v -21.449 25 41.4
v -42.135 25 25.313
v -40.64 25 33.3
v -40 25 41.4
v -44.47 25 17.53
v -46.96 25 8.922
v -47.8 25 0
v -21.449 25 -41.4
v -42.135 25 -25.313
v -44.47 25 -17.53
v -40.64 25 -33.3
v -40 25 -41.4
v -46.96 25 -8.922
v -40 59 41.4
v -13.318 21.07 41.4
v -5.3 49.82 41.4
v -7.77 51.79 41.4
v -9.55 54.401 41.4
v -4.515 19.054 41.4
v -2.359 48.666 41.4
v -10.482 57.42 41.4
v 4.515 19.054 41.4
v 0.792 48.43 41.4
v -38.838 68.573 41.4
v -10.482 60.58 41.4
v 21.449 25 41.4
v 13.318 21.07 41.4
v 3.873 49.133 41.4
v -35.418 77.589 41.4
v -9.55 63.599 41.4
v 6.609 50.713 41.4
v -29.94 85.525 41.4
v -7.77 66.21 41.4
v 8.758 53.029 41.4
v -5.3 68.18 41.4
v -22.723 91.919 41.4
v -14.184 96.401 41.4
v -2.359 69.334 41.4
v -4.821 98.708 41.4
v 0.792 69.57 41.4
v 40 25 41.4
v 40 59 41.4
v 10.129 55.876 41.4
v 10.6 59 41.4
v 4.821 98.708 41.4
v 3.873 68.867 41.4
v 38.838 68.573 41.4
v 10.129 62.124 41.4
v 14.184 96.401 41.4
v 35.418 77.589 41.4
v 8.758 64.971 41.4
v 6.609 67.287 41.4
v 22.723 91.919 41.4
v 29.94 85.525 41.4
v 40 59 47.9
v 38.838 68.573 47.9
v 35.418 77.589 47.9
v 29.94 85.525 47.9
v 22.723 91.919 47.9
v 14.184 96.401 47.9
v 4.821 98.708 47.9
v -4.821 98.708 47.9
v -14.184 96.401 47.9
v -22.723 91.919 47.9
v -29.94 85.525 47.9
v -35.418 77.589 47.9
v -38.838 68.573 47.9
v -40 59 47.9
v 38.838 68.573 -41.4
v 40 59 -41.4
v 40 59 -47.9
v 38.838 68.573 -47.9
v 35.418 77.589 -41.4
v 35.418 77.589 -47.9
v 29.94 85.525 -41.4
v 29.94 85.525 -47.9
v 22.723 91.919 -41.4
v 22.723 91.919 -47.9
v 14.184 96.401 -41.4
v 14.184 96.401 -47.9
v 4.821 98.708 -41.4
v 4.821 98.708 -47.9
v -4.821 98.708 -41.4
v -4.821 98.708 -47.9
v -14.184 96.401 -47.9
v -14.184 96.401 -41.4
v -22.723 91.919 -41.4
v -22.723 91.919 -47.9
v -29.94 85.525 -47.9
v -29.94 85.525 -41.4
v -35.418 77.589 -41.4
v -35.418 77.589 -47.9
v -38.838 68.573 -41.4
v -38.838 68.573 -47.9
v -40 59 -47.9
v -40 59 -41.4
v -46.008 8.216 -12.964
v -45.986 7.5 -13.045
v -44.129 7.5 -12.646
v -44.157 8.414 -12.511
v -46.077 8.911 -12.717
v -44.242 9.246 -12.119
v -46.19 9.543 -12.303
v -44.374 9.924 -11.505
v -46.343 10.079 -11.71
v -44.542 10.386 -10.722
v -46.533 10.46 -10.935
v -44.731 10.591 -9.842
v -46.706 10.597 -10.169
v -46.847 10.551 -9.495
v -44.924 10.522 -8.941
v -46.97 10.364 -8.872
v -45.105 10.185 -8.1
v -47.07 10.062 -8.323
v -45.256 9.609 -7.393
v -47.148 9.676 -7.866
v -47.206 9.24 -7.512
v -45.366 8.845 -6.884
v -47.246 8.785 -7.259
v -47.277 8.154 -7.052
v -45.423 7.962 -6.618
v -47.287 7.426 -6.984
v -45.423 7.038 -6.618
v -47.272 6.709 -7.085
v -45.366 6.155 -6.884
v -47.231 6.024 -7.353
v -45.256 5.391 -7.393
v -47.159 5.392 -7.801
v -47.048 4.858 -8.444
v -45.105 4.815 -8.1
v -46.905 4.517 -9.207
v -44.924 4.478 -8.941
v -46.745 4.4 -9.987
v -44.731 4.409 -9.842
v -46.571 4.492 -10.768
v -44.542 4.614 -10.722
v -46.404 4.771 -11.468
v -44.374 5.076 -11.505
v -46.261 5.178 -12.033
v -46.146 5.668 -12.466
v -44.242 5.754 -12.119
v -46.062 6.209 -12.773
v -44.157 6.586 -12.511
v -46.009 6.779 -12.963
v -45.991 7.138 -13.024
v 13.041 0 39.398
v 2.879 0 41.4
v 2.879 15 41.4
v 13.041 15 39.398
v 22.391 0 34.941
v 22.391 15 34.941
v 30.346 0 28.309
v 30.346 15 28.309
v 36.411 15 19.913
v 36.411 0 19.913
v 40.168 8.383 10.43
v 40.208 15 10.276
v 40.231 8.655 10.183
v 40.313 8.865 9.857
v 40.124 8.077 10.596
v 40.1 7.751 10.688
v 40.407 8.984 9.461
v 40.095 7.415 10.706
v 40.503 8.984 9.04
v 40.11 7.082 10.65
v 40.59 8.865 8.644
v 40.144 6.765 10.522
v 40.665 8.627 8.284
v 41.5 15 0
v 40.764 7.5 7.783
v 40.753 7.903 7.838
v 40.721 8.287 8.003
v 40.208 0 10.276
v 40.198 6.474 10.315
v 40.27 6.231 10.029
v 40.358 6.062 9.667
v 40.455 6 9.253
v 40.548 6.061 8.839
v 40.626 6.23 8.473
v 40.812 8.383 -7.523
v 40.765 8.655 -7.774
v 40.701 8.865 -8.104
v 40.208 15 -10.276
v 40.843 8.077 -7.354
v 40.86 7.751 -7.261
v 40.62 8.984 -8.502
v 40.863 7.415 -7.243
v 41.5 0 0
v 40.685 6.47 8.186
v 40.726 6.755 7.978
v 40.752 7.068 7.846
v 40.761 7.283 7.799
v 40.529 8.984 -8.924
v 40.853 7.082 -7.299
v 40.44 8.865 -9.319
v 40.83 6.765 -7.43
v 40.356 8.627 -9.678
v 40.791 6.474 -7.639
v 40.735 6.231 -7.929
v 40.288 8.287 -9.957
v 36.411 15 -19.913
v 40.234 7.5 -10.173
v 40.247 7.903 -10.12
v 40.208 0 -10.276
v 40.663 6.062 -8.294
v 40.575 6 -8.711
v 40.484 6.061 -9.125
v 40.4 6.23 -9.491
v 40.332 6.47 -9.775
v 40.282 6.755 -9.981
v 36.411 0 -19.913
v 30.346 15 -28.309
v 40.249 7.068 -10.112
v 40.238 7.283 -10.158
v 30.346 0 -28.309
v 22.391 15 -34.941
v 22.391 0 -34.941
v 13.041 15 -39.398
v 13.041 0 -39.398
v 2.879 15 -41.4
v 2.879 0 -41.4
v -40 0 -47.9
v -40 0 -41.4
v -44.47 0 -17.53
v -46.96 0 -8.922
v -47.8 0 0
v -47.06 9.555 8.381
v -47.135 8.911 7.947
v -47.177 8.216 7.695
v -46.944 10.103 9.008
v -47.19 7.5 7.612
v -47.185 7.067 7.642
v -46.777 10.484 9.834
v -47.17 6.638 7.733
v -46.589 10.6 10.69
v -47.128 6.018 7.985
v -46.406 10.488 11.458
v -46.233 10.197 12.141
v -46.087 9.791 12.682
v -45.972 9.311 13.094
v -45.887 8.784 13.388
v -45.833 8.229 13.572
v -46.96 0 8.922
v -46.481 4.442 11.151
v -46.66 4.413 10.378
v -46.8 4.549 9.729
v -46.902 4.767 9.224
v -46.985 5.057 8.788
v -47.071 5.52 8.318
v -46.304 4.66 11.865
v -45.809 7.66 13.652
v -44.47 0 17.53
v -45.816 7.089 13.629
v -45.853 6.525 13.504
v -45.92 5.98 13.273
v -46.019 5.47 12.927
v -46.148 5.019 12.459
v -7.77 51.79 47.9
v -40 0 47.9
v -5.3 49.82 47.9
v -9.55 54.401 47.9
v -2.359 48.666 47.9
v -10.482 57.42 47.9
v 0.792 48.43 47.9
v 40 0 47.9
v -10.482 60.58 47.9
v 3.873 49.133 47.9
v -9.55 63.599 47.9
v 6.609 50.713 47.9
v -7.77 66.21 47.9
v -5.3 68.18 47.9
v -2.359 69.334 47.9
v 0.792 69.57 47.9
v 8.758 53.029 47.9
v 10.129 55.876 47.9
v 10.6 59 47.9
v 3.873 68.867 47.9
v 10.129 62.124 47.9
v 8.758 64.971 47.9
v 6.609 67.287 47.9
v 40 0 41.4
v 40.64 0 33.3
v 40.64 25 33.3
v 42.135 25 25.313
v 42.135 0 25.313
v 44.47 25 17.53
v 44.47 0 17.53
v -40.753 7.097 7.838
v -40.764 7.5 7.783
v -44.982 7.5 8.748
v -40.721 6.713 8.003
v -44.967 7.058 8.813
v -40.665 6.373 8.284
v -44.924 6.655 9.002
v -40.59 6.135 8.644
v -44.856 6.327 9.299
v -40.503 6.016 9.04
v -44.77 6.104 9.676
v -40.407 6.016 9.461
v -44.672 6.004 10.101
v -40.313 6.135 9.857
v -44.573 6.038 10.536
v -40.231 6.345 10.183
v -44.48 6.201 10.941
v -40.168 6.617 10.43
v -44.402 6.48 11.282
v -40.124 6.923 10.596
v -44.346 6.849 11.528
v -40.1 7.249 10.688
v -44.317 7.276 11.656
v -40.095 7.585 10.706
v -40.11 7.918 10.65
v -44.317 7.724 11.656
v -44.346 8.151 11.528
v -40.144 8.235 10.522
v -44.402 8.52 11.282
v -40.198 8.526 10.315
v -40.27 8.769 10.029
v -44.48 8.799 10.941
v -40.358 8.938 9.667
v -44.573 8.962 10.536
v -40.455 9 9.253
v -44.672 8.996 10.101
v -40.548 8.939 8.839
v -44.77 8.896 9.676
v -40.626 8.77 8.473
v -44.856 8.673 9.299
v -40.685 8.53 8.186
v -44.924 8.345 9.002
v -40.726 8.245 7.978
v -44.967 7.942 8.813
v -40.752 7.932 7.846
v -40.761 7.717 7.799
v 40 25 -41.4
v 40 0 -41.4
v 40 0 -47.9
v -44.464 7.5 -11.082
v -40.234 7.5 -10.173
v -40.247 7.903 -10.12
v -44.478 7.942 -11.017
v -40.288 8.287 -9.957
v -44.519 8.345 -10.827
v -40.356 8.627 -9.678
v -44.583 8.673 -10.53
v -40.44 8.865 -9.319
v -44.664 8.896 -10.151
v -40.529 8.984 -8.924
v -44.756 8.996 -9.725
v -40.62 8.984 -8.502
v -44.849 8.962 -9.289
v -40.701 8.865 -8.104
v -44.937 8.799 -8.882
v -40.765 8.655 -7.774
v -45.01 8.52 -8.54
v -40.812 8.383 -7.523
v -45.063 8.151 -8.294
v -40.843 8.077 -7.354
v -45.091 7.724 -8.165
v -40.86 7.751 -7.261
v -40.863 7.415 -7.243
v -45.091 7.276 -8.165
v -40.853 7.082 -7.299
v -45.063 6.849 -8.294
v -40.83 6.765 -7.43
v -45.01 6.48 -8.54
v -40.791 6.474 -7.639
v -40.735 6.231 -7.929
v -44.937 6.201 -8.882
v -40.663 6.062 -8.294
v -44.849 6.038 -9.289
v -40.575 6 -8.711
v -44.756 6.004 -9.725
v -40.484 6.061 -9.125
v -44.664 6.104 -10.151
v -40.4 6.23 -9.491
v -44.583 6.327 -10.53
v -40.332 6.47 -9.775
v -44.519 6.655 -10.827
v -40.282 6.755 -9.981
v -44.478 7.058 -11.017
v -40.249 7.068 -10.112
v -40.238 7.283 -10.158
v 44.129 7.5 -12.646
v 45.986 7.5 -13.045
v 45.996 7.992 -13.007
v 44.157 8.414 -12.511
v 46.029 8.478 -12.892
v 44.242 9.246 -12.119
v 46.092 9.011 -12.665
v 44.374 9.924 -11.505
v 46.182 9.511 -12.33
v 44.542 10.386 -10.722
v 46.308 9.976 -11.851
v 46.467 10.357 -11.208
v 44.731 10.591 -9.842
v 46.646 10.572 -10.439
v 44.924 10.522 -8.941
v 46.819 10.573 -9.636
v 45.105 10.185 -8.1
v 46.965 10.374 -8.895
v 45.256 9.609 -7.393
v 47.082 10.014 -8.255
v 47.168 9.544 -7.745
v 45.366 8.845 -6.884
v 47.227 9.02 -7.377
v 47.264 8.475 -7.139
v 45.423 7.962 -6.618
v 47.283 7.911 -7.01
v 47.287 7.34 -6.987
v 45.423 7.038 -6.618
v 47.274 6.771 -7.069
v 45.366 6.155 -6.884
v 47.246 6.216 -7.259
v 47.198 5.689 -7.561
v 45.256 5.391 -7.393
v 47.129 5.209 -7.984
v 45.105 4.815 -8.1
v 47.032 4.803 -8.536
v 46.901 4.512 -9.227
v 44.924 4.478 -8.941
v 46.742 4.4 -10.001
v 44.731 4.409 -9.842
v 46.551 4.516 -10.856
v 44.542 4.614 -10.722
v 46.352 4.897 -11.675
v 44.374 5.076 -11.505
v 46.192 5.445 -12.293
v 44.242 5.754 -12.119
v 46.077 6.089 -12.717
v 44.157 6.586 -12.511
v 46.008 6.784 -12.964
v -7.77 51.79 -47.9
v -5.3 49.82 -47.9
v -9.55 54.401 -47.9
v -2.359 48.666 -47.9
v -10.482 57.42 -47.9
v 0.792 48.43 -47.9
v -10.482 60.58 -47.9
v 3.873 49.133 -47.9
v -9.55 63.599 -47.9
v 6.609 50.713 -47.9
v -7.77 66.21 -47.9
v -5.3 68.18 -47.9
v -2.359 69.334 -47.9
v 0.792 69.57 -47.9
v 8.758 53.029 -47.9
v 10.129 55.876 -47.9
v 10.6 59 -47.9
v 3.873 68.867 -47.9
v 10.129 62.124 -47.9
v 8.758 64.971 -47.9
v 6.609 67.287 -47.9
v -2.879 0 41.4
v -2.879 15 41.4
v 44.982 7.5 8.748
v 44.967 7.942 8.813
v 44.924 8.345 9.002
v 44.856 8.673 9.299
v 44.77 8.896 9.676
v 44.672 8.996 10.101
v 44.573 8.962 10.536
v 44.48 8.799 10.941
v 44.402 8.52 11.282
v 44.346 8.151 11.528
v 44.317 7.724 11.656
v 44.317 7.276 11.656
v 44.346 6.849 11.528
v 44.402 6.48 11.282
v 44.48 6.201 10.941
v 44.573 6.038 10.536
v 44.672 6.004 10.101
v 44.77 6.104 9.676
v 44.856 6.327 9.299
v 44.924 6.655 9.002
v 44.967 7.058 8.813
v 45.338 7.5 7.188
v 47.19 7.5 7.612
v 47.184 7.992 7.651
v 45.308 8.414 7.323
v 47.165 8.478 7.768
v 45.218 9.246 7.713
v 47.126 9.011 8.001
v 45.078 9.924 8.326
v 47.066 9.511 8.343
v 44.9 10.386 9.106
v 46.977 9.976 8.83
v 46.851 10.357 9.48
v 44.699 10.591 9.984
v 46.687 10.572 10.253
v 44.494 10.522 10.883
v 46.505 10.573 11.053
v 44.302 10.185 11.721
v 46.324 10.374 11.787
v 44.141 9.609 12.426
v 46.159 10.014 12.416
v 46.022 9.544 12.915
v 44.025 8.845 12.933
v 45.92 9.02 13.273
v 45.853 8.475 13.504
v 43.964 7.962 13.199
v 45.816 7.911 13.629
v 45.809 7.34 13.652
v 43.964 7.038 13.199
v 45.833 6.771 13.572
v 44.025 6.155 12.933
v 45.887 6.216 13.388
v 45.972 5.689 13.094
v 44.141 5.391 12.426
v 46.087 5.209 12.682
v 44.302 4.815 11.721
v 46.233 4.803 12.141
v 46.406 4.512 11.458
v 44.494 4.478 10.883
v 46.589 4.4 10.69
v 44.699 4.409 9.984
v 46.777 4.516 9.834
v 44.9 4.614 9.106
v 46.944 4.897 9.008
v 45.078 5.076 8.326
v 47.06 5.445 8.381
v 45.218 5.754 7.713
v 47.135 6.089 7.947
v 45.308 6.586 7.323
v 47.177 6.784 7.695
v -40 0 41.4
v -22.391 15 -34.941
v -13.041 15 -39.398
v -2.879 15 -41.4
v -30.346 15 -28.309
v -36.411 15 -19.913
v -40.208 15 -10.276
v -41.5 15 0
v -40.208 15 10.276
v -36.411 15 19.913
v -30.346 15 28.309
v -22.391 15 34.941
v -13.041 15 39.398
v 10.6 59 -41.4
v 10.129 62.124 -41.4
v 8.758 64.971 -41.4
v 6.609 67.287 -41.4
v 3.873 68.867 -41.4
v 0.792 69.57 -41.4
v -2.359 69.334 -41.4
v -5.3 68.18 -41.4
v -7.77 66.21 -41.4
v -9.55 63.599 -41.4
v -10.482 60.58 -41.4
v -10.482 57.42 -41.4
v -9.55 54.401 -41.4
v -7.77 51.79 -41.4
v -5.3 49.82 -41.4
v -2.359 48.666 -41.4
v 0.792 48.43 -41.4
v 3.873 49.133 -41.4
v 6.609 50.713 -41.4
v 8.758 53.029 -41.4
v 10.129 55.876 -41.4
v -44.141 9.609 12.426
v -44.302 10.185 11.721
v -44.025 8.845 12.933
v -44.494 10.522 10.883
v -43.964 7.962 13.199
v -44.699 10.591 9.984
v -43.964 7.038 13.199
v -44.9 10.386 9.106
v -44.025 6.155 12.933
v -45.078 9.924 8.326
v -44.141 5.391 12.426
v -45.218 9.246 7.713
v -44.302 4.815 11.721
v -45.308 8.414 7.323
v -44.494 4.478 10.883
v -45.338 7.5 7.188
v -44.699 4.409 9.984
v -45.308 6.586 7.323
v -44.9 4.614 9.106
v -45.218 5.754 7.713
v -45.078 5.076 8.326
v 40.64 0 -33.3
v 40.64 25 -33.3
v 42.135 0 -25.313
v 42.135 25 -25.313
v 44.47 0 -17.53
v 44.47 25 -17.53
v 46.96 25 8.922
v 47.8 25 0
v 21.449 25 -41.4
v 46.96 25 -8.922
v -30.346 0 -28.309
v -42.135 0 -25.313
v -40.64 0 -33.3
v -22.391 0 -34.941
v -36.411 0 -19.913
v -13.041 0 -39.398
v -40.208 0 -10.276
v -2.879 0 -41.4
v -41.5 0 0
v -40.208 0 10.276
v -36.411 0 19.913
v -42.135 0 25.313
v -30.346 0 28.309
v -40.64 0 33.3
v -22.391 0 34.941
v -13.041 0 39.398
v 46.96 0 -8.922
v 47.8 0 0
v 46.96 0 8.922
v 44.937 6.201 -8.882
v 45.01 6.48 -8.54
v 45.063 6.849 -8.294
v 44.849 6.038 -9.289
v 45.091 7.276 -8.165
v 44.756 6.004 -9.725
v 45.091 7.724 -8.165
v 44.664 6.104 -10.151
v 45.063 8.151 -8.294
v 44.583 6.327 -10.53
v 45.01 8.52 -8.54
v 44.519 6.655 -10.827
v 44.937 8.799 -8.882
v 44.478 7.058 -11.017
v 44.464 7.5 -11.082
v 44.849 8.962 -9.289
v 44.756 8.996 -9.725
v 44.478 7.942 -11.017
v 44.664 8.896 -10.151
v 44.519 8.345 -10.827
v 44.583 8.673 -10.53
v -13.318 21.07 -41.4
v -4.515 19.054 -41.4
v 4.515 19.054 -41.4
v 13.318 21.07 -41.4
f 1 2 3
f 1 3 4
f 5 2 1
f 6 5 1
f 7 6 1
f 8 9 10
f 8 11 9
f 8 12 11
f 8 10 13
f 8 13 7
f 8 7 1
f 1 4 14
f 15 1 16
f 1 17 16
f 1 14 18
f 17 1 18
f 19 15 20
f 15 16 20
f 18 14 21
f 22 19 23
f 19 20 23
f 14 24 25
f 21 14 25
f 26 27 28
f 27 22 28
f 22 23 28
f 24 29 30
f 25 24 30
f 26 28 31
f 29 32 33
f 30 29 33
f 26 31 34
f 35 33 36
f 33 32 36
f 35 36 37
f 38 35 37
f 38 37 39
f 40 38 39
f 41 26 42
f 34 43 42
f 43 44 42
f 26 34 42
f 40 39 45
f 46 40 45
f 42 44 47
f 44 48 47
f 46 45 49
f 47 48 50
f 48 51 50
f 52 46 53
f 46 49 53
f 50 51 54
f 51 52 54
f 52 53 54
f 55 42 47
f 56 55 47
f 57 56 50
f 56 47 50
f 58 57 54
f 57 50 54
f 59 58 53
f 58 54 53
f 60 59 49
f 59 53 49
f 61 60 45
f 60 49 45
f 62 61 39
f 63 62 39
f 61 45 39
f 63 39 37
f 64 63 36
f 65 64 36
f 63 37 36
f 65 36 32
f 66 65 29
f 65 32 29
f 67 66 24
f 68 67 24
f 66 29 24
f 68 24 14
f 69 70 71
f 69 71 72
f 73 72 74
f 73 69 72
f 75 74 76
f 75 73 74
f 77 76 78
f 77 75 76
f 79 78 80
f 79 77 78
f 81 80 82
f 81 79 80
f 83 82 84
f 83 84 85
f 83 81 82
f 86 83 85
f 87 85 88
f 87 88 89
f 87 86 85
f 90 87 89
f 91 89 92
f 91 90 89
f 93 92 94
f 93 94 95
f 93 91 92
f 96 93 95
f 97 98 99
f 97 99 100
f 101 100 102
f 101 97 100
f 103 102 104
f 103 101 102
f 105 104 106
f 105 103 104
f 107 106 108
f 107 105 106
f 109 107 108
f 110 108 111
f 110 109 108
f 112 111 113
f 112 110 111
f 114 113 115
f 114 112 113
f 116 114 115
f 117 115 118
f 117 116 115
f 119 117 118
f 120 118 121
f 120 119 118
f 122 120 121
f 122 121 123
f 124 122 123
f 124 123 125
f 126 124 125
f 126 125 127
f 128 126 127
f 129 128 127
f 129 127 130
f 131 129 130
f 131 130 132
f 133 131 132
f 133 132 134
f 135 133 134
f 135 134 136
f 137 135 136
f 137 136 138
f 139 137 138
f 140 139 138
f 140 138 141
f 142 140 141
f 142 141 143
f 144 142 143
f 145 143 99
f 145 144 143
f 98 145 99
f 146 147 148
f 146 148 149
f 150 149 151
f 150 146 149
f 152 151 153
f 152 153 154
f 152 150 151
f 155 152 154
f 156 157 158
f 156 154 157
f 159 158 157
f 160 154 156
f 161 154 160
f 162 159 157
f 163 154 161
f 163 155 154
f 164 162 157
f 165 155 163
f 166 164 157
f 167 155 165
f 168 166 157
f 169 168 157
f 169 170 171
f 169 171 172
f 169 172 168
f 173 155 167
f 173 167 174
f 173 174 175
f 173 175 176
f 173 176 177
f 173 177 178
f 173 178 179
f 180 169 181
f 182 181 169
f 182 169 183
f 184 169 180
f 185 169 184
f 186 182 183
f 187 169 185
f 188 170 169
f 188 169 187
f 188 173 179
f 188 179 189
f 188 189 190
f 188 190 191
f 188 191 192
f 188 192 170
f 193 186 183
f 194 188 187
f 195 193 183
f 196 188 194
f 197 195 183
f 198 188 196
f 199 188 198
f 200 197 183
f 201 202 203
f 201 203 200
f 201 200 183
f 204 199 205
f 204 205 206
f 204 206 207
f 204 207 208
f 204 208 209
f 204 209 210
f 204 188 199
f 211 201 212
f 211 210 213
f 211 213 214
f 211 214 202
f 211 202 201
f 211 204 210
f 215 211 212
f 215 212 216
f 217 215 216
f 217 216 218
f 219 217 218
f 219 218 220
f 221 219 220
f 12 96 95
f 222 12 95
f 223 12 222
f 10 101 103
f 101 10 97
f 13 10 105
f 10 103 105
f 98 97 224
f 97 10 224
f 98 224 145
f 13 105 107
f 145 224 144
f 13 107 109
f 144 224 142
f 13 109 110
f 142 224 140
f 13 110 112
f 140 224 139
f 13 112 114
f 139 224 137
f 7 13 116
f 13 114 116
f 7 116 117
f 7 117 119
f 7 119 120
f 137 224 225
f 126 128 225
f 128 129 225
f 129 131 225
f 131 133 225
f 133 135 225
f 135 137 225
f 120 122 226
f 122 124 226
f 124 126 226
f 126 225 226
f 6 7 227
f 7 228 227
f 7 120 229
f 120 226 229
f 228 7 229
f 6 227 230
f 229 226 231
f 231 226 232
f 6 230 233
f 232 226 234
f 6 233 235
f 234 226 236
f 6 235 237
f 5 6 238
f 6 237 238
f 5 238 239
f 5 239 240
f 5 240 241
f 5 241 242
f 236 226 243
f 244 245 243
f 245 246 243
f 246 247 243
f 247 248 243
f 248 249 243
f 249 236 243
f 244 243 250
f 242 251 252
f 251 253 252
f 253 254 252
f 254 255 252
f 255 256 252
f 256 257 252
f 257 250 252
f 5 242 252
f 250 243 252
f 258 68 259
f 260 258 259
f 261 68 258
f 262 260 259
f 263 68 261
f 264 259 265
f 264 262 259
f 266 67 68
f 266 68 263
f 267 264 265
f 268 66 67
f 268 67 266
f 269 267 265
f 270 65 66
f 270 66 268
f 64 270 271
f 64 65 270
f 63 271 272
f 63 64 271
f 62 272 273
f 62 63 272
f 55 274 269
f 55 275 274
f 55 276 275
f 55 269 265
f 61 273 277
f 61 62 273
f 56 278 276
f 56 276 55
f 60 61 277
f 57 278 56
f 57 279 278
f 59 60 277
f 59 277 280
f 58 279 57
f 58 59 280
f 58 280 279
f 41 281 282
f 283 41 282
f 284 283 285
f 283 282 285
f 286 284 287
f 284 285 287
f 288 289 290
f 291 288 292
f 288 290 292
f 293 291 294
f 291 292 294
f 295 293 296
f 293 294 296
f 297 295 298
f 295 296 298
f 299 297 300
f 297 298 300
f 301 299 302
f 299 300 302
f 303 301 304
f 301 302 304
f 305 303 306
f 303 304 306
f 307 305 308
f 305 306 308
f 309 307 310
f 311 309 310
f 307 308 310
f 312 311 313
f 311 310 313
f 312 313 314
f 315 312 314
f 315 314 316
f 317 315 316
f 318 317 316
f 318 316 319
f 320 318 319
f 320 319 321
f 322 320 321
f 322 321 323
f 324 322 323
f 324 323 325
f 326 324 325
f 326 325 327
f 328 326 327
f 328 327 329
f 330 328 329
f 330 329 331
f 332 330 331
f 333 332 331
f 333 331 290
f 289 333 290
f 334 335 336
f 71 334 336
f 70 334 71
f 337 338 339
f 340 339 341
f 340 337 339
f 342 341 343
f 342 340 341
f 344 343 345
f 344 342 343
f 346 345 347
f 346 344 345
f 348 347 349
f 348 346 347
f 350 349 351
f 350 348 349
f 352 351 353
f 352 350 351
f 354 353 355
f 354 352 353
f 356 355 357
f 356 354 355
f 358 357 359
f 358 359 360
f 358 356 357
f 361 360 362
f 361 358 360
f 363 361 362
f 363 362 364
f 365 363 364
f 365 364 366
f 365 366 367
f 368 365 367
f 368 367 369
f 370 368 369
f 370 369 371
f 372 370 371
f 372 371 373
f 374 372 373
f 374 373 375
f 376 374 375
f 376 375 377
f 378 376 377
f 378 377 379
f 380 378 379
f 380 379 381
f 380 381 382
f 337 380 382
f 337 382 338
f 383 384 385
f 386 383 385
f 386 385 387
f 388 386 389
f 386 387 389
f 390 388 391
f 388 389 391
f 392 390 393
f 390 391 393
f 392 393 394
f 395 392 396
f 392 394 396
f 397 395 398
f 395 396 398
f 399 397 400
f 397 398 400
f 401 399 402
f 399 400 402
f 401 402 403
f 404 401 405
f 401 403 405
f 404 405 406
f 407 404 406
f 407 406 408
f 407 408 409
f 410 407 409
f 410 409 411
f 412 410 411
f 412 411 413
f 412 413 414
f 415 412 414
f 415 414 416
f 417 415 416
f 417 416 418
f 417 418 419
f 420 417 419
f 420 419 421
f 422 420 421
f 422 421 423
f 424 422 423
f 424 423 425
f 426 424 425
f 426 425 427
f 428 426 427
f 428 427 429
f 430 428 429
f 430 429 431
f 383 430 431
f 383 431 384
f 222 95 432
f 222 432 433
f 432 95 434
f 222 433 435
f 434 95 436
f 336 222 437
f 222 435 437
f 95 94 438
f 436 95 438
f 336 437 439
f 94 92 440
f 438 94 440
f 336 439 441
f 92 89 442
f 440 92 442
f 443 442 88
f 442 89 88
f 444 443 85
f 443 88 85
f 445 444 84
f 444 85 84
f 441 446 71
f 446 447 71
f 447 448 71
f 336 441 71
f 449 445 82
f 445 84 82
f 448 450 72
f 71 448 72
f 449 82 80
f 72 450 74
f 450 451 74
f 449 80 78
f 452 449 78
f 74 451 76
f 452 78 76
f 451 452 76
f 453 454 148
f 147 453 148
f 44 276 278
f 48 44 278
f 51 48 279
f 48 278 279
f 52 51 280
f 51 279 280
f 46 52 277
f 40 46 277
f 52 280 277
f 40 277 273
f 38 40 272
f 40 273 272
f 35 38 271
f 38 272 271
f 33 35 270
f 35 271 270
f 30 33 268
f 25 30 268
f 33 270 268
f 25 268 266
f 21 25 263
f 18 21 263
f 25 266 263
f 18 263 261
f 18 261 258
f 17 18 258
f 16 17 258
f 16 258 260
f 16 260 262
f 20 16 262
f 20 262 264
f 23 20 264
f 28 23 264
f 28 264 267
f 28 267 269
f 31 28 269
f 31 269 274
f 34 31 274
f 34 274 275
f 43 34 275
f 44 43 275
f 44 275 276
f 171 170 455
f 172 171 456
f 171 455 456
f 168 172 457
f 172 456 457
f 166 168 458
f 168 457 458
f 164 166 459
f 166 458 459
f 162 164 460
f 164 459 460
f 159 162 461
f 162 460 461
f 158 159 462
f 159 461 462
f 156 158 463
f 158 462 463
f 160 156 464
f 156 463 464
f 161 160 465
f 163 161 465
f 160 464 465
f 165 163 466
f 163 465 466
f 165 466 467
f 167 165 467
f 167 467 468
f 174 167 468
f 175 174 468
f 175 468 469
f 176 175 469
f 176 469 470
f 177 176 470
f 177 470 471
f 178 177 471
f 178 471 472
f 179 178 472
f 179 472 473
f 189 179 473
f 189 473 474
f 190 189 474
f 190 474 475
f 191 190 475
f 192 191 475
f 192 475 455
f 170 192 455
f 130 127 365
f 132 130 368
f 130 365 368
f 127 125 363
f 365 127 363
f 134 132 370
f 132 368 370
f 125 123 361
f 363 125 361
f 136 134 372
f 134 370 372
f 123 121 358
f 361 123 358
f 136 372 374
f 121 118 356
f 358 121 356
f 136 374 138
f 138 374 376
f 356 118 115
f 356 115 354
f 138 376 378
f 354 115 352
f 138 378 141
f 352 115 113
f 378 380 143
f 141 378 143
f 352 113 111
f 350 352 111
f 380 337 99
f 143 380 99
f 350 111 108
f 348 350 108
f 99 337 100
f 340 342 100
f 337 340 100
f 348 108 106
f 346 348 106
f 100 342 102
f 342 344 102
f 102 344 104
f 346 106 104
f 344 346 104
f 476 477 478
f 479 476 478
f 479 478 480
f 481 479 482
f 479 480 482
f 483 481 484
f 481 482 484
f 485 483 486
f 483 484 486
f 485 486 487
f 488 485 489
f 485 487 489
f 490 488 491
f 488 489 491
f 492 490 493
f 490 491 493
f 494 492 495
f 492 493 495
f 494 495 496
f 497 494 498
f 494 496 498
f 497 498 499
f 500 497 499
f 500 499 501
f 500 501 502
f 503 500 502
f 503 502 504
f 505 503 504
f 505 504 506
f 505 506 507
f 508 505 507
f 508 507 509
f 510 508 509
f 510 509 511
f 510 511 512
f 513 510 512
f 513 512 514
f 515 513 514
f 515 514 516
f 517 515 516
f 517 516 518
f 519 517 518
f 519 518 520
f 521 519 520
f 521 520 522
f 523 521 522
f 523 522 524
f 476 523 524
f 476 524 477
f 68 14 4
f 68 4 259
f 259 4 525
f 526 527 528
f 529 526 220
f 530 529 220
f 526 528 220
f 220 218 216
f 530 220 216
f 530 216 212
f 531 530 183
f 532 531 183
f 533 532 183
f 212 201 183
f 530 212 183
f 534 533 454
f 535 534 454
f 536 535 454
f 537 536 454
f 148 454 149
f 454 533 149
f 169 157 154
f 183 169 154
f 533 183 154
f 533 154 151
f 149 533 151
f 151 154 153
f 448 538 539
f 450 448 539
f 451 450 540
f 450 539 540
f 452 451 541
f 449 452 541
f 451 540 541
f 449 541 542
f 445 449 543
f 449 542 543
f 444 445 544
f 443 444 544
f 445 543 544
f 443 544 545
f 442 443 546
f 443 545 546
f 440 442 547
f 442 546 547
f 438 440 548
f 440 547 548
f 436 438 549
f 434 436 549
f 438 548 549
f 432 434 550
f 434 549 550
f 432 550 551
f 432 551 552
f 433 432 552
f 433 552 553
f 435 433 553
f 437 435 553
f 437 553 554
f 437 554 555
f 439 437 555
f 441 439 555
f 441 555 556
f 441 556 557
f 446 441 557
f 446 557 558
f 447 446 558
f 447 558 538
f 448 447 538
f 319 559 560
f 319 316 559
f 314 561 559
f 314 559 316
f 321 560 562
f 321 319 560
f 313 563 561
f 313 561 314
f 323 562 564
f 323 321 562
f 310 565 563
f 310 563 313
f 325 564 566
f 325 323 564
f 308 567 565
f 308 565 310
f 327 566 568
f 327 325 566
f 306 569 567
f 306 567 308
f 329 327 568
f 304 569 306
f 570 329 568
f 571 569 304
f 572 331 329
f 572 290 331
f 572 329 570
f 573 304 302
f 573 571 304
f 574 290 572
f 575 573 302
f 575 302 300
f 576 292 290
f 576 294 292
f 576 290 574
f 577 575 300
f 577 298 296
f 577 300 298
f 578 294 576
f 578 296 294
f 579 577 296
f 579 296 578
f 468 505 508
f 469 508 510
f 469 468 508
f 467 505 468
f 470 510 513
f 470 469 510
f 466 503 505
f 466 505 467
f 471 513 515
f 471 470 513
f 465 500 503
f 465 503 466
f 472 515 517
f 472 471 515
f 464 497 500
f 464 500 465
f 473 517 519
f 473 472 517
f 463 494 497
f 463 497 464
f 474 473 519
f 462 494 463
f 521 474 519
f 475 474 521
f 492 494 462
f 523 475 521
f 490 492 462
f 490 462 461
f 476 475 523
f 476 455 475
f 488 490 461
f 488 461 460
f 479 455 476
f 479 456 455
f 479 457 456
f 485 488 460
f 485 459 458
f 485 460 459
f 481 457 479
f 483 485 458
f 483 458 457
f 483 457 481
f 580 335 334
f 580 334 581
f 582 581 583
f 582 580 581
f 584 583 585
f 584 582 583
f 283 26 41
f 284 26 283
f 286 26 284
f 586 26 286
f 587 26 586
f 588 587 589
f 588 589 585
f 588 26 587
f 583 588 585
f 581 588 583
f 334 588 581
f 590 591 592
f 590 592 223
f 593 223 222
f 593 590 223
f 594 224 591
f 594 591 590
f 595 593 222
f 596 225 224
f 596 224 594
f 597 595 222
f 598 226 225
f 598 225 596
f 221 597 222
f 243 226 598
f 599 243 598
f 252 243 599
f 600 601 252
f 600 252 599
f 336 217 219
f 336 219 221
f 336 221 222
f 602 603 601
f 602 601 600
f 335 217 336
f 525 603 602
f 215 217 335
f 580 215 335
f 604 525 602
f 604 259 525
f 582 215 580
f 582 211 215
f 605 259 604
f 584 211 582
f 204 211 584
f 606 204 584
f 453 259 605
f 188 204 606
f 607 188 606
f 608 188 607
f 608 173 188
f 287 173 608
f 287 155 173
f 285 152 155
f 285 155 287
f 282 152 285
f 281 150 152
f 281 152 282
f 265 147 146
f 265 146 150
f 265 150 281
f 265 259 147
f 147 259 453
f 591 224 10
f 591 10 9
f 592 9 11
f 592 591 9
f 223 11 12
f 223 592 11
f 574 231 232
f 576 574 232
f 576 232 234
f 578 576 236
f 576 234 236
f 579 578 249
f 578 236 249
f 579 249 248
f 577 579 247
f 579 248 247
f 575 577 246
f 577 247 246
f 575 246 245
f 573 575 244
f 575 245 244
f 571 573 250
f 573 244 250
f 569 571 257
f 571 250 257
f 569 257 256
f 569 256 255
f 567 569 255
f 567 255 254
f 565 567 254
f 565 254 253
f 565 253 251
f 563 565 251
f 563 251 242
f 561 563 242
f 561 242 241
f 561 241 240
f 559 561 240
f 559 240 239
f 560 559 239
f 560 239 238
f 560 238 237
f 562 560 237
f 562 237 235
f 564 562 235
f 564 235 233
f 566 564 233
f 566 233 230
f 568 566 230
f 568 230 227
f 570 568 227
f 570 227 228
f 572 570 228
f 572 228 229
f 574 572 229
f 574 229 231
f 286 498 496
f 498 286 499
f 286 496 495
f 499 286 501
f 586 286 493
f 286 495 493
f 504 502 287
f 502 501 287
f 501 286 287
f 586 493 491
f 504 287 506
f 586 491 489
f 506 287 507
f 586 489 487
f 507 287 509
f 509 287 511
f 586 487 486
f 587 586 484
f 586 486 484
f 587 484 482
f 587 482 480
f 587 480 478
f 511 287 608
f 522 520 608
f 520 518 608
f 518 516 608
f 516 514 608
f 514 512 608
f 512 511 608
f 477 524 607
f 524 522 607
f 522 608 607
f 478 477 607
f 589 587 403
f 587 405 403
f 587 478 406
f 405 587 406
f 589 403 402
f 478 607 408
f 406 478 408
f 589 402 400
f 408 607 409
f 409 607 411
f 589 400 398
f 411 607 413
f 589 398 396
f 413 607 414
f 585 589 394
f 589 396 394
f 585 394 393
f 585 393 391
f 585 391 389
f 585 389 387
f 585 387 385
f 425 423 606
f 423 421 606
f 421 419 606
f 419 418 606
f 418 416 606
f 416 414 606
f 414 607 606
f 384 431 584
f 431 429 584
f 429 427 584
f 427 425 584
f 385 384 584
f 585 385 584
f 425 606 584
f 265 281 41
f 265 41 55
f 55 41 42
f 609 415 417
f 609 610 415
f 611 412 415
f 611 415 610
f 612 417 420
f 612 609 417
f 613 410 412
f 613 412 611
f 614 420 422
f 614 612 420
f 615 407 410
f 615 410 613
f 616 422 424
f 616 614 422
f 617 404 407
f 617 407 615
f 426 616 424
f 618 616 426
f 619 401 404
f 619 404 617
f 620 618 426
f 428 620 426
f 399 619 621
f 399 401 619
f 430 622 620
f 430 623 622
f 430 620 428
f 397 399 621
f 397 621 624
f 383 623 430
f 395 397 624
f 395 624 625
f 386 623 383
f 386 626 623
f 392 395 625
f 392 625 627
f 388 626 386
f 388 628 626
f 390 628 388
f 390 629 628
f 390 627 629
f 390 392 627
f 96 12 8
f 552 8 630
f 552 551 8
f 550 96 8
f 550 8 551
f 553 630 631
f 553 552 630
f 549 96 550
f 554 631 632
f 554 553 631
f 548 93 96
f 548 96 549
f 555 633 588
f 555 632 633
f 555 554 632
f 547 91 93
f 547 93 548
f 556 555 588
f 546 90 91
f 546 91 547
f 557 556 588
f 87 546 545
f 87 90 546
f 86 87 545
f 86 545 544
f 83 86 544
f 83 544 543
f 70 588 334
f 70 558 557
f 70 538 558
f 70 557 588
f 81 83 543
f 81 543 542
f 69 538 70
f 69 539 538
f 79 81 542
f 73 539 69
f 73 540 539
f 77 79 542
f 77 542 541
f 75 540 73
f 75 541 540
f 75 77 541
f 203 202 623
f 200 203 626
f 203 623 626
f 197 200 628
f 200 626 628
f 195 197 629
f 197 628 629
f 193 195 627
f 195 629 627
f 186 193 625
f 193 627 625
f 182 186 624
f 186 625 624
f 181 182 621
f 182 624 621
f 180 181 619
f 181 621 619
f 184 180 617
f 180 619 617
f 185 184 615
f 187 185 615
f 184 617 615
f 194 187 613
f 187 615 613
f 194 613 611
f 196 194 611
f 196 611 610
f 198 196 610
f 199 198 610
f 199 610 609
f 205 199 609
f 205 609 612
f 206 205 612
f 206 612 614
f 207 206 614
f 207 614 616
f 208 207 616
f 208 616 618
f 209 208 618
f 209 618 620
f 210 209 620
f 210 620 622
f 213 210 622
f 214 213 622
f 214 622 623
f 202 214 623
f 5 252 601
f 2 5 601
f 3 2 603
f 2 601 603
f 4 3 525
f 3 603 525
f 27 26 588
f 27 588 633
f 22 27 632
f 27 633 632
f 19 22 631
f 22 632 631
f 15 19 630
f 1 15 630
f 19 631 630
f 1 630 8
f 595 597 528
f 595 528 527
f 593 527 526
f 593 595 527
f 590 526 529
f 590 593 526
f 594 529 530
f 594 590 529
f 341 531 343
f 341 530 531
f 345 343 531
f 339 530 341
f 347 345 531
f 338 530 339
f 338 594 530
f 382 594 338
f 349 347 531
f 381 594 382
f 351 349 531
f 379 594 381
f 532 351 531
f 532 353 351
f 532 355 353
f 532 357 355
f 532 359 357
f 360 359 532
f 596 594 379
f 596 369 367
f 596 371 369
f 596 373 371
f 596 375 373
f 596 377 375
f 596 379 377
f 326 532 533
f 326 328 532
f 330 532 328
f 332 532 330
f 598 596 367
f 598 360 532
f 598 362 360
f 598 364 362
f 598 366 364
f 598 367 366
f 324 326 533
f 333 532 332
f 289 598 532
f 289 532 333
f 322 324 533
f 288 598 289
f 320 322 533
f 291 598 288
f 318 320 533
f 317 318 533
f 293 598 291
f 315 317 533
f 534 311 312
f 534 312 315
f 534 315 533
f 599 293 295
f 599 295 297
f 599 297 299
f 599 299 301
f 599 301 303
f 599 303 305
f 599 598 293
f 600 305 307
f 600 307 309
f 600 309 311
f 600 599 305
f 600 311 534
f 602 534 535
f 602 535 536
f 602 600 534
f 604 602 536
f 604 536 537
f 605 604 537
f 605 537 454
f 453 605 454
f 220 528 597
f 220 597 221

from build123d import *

# Parameters (mm, degrees)
SKETCH1_R                  = 47.8
SKETCH1_R_2                = 41.5
CAP_BASE_DEPTH             = 15
SKETCH2_R                  = 47.8
CAP_TOP_DEPTH              = 10
SIDES_START                = 41.4
SIDES_DEPTH                = 6.5
SIDES_START_2              = -25
SIDES_TO_CAP_DEPTH         = 25
SKETCH5_R                  = 40.2
TRACKS_FOR_HOUSING_DEPTH   = 45
SKETCH6_R                  = 10.6
HOLE_FOR_GEAR_SHAFTS_DEPTH = 146.82002606
SKETCH9_R                  = 1.5
CUT_EXTRUDE2_DEPTH         = 10
CIRPATTERN1_COUNT          = 2
CIRPATTERN1_ANGLE          = 25
MIRROR2_COPY_1_SKETCH_R    = 1.5
MIRROR2_COPY_1_DEPTH       = 10
SKETCH10_R                 = 3.1
CUT_EXTRUDE3_DEPTH         = 2
CIRPATTERN2_COUNT          = 2
CIRPATTERN2_ANGLE          = 25
MIRROR3_COPY_1_SKETCH_R    = 3.1
MIRROR3_COPY_1_DEPTH       = 2


with BuildPart() as part:
    # Sketch1 → Cap base (new body)
    with BuildSketch(Plane(origin=(0, 0, 0), x_dir=(1, 0, 0), z_dir=(0, 1, 0))):
        with Locations(Location((0, 0, 0), (0, 0, 270))):
            Circle(SKETCH1_R)
        with Locations(Location((0, 0, 0), (0, 0, 270))):
            Circle(SKETCH1_R_2, mode=Mode.SUBTRACT)
    extrude(amount=CAP_BASE_DEPTH)

    # Sketch2 → Cap top (add)
    with BuildSketch(Plane(origin=(0, 15, 0), x_dir=(1, 0, 0), z_dir=(0, 1, 0))):
        with Locations(Location((0, 0, 0), (0, 0, 270))):
            Circle(SKETCH2_R)
    extrude(amount=CAP_TOP_DEPTH)

    # Sketch3 → Sides (add)
    with BuildSketch(Plane.XY.offset(SIDES_START)):
        with BuildLine():
            Line((-40, 59), (-40, 0))
            Line((-40, 0), (40, 0))
            Line((40, 0), (40, 59))
            ThreePointArc((40, 59), (0, 99), (-40, 59))
        make_face()
    sides = extrude(amount=SIDES_DEPTH)

    # Sketch4 → Sides to cap (add)
    with BuildSketch(Plane(origin=(0, 25, 0), x_dir=(1, 0, 0), z_dir=(0, 1, 0)).offset(SIDES_START_2)):
        with BuildLine():
            ThreePointArc((-23.893095237, -41.4), (-36.205132569, -31.209427673), (-44.469611721, -17.529792737))
            ThreePointArc((-44.469611721, -17.529792737), (-41.281194911, -29.286336098), (-40, -41.4))
            Line((-40, -41.4), (-23.893095237, -41.4))
        make_face()
        with BuildLine():
            Line((23.893095237, -41.4), (40, -41.4))
            ThreePointArc((40, -41.4), (41.281194911, -29.286336098), (44.469611721, -17.529792737))
            ThreePointArc((44.469611721, -17.529792737), (36.205132569, -31.209427673), (23.893095237, -41.4))
        make_face()
    sides_to_cap = extrude(amount=SIDES_TO_CAP_DEPTH)

    # Mirror1: Sides to cap across plane
    add(sides_to_cap.mirror(Plane.XY))

    # Mirror sides: Sides across plane
    add(sides.mirror(Plane.XY))

    # Sketch5 → Tracks for housing (cut)
    with BuildSketch(Plane(origin=(0, 0, 41.4), x_dir=(-1, 0, 0), z_dir=(0, 0, -1))):
        with Locations((0, 59)):
            Circle(SKETCH5_R)
    tracks_for_housing = extrude(amount=TRACKS_FOR_HOUSING_DEPTH, mode=Mode.SUBTRACT)

    # Mirror tracks: Tracks for housing across plane
    add(tracks_for_housing.mirror(Plane.XY), mode=Mode.SUBTRACT)

    # Sketch6 → Hole for gear shafts (cut, through all)
    with BuildSketch(Plane.XY.offset(47.9)):
        with Locations((0, 59)):
            Circle(SKETCH6_R)
    extrude(amount=-HOLE_FOR_GEAR_SHAFTS_DEPTH, mode=Mode.SUBTRACT)

    # Sketch9 → Cut-Extrude2 (cut)
    with BuildSketch(Plane(origin=(46.73476934, 0, -10.035005469), x_dir=(-0.20993735290442256, 0, -0.9777148397439225), z_dir=(0.9777148397439225, 0, -0.20993735290442256))):
        with Locations((0, 7.5)):
            Circle(SKETCH9_R)
    cut_extrude2 = extrude(amount=-CUT_EXTRUDE2_DEPTH, mode=Mode.SUBTRACT)

    # CirPattern1: Cut-Extrude2 ×2 about axis
    cirpattern1_axis = Axis((0, 15, 0), (0, -1, 0))
    for i in range(1, CIRPATTERN1_COUNT):
        add(cut_extrude2.rotate(cirpattern1_axis, i * CIRPATTERN1_ANGLE / (CIRPATTERN1_COUNT - 1)), mode=Mode.SUBTRACT)

    # Mirror2: Cut-Extrude2 across plane
    add(cut_extrude2.mirror(Plane(origin=(0, 0, 0), x_dir=(0, 0, 1), z_dir=(1, 0, 0))), mode=Mode.SUBTRACT)

    # Mirror2 copy 1 sketch → Mirror2 copy 1 (cut)
    with BuildSketch(Plane(origin=(-46.597061946, 0, 10.656163382), x_dir=(-0.2229322883235245, 0, -0.9748339319201179), z_dir=(-0.9748339319201179, 0, 0.2229322883235245))):
        with Locations((0, -7.5)):
            Circle(MIRROR2_COPY_1_SKETCH_R)
    extrude(amount=-MIRROR2_COPY_1_DEPTH, mode=Mode.SUBTRACT)

    # Sketch10 → Cut-Extrude3 (cut)
    with BuildSketch(Plane(origin=(46.73476934, 0, -10.035005469), x_dir=(-0.20993735290442256, 0, -0.9777148397439225), z_dir=(0.9777148397439225, 0, -0.20993735290442256))):
        with Locations((0, 7.5)):
            Circle(SKETCH10_R)
    cut_extrude3 = extrude(amount=-CUT_EXTRUDE3_DEPTH, mode=Mode.SUBTRACT)

    # CirPattern2: Cut-Extrude3 ×2 about axis
    cirpattern2_axis = Axis((0, 15, 0), (0, -1, 0))
    for i in range(1, CIRPATTERN2_COUNT):
        add(cut_extrude3.rotate(cirpattern2_axis, i * CIRPATTERN2_ANGLE / (CIRPATTERN2_COUNT - 1)), mode=Mode.SUBTRACT)

    # Mirror3: Cut-Extrude3 across plane
    add(cut_extrude3.mirror(Plane(origin=(0, 0, 0), x_dir=(0, 0, 1), z_dir=(1, 0, 0))), mode=Mode.SUBTRACT)

    # Mirror3 copy 1 sketch → Mirror3 copy 1 (cut)
    with BuildSketch(Plane(origin=(-46.597061946, 0, 10.656163382), x_dir=(-0.22293228832352457, 0, -0.9748339319201178), z_dir=(-0.9748339319201178, 0, 0.22293228832352457))):
        with Locations((0, -7.5)):
            Circle(MIRROR3_COPY_1_SKETCH_R)
    extrude(amount=-MIRROR3_COPY_1_DEPTH, mode=Mode.SUBTRACT)


solid = part.part
